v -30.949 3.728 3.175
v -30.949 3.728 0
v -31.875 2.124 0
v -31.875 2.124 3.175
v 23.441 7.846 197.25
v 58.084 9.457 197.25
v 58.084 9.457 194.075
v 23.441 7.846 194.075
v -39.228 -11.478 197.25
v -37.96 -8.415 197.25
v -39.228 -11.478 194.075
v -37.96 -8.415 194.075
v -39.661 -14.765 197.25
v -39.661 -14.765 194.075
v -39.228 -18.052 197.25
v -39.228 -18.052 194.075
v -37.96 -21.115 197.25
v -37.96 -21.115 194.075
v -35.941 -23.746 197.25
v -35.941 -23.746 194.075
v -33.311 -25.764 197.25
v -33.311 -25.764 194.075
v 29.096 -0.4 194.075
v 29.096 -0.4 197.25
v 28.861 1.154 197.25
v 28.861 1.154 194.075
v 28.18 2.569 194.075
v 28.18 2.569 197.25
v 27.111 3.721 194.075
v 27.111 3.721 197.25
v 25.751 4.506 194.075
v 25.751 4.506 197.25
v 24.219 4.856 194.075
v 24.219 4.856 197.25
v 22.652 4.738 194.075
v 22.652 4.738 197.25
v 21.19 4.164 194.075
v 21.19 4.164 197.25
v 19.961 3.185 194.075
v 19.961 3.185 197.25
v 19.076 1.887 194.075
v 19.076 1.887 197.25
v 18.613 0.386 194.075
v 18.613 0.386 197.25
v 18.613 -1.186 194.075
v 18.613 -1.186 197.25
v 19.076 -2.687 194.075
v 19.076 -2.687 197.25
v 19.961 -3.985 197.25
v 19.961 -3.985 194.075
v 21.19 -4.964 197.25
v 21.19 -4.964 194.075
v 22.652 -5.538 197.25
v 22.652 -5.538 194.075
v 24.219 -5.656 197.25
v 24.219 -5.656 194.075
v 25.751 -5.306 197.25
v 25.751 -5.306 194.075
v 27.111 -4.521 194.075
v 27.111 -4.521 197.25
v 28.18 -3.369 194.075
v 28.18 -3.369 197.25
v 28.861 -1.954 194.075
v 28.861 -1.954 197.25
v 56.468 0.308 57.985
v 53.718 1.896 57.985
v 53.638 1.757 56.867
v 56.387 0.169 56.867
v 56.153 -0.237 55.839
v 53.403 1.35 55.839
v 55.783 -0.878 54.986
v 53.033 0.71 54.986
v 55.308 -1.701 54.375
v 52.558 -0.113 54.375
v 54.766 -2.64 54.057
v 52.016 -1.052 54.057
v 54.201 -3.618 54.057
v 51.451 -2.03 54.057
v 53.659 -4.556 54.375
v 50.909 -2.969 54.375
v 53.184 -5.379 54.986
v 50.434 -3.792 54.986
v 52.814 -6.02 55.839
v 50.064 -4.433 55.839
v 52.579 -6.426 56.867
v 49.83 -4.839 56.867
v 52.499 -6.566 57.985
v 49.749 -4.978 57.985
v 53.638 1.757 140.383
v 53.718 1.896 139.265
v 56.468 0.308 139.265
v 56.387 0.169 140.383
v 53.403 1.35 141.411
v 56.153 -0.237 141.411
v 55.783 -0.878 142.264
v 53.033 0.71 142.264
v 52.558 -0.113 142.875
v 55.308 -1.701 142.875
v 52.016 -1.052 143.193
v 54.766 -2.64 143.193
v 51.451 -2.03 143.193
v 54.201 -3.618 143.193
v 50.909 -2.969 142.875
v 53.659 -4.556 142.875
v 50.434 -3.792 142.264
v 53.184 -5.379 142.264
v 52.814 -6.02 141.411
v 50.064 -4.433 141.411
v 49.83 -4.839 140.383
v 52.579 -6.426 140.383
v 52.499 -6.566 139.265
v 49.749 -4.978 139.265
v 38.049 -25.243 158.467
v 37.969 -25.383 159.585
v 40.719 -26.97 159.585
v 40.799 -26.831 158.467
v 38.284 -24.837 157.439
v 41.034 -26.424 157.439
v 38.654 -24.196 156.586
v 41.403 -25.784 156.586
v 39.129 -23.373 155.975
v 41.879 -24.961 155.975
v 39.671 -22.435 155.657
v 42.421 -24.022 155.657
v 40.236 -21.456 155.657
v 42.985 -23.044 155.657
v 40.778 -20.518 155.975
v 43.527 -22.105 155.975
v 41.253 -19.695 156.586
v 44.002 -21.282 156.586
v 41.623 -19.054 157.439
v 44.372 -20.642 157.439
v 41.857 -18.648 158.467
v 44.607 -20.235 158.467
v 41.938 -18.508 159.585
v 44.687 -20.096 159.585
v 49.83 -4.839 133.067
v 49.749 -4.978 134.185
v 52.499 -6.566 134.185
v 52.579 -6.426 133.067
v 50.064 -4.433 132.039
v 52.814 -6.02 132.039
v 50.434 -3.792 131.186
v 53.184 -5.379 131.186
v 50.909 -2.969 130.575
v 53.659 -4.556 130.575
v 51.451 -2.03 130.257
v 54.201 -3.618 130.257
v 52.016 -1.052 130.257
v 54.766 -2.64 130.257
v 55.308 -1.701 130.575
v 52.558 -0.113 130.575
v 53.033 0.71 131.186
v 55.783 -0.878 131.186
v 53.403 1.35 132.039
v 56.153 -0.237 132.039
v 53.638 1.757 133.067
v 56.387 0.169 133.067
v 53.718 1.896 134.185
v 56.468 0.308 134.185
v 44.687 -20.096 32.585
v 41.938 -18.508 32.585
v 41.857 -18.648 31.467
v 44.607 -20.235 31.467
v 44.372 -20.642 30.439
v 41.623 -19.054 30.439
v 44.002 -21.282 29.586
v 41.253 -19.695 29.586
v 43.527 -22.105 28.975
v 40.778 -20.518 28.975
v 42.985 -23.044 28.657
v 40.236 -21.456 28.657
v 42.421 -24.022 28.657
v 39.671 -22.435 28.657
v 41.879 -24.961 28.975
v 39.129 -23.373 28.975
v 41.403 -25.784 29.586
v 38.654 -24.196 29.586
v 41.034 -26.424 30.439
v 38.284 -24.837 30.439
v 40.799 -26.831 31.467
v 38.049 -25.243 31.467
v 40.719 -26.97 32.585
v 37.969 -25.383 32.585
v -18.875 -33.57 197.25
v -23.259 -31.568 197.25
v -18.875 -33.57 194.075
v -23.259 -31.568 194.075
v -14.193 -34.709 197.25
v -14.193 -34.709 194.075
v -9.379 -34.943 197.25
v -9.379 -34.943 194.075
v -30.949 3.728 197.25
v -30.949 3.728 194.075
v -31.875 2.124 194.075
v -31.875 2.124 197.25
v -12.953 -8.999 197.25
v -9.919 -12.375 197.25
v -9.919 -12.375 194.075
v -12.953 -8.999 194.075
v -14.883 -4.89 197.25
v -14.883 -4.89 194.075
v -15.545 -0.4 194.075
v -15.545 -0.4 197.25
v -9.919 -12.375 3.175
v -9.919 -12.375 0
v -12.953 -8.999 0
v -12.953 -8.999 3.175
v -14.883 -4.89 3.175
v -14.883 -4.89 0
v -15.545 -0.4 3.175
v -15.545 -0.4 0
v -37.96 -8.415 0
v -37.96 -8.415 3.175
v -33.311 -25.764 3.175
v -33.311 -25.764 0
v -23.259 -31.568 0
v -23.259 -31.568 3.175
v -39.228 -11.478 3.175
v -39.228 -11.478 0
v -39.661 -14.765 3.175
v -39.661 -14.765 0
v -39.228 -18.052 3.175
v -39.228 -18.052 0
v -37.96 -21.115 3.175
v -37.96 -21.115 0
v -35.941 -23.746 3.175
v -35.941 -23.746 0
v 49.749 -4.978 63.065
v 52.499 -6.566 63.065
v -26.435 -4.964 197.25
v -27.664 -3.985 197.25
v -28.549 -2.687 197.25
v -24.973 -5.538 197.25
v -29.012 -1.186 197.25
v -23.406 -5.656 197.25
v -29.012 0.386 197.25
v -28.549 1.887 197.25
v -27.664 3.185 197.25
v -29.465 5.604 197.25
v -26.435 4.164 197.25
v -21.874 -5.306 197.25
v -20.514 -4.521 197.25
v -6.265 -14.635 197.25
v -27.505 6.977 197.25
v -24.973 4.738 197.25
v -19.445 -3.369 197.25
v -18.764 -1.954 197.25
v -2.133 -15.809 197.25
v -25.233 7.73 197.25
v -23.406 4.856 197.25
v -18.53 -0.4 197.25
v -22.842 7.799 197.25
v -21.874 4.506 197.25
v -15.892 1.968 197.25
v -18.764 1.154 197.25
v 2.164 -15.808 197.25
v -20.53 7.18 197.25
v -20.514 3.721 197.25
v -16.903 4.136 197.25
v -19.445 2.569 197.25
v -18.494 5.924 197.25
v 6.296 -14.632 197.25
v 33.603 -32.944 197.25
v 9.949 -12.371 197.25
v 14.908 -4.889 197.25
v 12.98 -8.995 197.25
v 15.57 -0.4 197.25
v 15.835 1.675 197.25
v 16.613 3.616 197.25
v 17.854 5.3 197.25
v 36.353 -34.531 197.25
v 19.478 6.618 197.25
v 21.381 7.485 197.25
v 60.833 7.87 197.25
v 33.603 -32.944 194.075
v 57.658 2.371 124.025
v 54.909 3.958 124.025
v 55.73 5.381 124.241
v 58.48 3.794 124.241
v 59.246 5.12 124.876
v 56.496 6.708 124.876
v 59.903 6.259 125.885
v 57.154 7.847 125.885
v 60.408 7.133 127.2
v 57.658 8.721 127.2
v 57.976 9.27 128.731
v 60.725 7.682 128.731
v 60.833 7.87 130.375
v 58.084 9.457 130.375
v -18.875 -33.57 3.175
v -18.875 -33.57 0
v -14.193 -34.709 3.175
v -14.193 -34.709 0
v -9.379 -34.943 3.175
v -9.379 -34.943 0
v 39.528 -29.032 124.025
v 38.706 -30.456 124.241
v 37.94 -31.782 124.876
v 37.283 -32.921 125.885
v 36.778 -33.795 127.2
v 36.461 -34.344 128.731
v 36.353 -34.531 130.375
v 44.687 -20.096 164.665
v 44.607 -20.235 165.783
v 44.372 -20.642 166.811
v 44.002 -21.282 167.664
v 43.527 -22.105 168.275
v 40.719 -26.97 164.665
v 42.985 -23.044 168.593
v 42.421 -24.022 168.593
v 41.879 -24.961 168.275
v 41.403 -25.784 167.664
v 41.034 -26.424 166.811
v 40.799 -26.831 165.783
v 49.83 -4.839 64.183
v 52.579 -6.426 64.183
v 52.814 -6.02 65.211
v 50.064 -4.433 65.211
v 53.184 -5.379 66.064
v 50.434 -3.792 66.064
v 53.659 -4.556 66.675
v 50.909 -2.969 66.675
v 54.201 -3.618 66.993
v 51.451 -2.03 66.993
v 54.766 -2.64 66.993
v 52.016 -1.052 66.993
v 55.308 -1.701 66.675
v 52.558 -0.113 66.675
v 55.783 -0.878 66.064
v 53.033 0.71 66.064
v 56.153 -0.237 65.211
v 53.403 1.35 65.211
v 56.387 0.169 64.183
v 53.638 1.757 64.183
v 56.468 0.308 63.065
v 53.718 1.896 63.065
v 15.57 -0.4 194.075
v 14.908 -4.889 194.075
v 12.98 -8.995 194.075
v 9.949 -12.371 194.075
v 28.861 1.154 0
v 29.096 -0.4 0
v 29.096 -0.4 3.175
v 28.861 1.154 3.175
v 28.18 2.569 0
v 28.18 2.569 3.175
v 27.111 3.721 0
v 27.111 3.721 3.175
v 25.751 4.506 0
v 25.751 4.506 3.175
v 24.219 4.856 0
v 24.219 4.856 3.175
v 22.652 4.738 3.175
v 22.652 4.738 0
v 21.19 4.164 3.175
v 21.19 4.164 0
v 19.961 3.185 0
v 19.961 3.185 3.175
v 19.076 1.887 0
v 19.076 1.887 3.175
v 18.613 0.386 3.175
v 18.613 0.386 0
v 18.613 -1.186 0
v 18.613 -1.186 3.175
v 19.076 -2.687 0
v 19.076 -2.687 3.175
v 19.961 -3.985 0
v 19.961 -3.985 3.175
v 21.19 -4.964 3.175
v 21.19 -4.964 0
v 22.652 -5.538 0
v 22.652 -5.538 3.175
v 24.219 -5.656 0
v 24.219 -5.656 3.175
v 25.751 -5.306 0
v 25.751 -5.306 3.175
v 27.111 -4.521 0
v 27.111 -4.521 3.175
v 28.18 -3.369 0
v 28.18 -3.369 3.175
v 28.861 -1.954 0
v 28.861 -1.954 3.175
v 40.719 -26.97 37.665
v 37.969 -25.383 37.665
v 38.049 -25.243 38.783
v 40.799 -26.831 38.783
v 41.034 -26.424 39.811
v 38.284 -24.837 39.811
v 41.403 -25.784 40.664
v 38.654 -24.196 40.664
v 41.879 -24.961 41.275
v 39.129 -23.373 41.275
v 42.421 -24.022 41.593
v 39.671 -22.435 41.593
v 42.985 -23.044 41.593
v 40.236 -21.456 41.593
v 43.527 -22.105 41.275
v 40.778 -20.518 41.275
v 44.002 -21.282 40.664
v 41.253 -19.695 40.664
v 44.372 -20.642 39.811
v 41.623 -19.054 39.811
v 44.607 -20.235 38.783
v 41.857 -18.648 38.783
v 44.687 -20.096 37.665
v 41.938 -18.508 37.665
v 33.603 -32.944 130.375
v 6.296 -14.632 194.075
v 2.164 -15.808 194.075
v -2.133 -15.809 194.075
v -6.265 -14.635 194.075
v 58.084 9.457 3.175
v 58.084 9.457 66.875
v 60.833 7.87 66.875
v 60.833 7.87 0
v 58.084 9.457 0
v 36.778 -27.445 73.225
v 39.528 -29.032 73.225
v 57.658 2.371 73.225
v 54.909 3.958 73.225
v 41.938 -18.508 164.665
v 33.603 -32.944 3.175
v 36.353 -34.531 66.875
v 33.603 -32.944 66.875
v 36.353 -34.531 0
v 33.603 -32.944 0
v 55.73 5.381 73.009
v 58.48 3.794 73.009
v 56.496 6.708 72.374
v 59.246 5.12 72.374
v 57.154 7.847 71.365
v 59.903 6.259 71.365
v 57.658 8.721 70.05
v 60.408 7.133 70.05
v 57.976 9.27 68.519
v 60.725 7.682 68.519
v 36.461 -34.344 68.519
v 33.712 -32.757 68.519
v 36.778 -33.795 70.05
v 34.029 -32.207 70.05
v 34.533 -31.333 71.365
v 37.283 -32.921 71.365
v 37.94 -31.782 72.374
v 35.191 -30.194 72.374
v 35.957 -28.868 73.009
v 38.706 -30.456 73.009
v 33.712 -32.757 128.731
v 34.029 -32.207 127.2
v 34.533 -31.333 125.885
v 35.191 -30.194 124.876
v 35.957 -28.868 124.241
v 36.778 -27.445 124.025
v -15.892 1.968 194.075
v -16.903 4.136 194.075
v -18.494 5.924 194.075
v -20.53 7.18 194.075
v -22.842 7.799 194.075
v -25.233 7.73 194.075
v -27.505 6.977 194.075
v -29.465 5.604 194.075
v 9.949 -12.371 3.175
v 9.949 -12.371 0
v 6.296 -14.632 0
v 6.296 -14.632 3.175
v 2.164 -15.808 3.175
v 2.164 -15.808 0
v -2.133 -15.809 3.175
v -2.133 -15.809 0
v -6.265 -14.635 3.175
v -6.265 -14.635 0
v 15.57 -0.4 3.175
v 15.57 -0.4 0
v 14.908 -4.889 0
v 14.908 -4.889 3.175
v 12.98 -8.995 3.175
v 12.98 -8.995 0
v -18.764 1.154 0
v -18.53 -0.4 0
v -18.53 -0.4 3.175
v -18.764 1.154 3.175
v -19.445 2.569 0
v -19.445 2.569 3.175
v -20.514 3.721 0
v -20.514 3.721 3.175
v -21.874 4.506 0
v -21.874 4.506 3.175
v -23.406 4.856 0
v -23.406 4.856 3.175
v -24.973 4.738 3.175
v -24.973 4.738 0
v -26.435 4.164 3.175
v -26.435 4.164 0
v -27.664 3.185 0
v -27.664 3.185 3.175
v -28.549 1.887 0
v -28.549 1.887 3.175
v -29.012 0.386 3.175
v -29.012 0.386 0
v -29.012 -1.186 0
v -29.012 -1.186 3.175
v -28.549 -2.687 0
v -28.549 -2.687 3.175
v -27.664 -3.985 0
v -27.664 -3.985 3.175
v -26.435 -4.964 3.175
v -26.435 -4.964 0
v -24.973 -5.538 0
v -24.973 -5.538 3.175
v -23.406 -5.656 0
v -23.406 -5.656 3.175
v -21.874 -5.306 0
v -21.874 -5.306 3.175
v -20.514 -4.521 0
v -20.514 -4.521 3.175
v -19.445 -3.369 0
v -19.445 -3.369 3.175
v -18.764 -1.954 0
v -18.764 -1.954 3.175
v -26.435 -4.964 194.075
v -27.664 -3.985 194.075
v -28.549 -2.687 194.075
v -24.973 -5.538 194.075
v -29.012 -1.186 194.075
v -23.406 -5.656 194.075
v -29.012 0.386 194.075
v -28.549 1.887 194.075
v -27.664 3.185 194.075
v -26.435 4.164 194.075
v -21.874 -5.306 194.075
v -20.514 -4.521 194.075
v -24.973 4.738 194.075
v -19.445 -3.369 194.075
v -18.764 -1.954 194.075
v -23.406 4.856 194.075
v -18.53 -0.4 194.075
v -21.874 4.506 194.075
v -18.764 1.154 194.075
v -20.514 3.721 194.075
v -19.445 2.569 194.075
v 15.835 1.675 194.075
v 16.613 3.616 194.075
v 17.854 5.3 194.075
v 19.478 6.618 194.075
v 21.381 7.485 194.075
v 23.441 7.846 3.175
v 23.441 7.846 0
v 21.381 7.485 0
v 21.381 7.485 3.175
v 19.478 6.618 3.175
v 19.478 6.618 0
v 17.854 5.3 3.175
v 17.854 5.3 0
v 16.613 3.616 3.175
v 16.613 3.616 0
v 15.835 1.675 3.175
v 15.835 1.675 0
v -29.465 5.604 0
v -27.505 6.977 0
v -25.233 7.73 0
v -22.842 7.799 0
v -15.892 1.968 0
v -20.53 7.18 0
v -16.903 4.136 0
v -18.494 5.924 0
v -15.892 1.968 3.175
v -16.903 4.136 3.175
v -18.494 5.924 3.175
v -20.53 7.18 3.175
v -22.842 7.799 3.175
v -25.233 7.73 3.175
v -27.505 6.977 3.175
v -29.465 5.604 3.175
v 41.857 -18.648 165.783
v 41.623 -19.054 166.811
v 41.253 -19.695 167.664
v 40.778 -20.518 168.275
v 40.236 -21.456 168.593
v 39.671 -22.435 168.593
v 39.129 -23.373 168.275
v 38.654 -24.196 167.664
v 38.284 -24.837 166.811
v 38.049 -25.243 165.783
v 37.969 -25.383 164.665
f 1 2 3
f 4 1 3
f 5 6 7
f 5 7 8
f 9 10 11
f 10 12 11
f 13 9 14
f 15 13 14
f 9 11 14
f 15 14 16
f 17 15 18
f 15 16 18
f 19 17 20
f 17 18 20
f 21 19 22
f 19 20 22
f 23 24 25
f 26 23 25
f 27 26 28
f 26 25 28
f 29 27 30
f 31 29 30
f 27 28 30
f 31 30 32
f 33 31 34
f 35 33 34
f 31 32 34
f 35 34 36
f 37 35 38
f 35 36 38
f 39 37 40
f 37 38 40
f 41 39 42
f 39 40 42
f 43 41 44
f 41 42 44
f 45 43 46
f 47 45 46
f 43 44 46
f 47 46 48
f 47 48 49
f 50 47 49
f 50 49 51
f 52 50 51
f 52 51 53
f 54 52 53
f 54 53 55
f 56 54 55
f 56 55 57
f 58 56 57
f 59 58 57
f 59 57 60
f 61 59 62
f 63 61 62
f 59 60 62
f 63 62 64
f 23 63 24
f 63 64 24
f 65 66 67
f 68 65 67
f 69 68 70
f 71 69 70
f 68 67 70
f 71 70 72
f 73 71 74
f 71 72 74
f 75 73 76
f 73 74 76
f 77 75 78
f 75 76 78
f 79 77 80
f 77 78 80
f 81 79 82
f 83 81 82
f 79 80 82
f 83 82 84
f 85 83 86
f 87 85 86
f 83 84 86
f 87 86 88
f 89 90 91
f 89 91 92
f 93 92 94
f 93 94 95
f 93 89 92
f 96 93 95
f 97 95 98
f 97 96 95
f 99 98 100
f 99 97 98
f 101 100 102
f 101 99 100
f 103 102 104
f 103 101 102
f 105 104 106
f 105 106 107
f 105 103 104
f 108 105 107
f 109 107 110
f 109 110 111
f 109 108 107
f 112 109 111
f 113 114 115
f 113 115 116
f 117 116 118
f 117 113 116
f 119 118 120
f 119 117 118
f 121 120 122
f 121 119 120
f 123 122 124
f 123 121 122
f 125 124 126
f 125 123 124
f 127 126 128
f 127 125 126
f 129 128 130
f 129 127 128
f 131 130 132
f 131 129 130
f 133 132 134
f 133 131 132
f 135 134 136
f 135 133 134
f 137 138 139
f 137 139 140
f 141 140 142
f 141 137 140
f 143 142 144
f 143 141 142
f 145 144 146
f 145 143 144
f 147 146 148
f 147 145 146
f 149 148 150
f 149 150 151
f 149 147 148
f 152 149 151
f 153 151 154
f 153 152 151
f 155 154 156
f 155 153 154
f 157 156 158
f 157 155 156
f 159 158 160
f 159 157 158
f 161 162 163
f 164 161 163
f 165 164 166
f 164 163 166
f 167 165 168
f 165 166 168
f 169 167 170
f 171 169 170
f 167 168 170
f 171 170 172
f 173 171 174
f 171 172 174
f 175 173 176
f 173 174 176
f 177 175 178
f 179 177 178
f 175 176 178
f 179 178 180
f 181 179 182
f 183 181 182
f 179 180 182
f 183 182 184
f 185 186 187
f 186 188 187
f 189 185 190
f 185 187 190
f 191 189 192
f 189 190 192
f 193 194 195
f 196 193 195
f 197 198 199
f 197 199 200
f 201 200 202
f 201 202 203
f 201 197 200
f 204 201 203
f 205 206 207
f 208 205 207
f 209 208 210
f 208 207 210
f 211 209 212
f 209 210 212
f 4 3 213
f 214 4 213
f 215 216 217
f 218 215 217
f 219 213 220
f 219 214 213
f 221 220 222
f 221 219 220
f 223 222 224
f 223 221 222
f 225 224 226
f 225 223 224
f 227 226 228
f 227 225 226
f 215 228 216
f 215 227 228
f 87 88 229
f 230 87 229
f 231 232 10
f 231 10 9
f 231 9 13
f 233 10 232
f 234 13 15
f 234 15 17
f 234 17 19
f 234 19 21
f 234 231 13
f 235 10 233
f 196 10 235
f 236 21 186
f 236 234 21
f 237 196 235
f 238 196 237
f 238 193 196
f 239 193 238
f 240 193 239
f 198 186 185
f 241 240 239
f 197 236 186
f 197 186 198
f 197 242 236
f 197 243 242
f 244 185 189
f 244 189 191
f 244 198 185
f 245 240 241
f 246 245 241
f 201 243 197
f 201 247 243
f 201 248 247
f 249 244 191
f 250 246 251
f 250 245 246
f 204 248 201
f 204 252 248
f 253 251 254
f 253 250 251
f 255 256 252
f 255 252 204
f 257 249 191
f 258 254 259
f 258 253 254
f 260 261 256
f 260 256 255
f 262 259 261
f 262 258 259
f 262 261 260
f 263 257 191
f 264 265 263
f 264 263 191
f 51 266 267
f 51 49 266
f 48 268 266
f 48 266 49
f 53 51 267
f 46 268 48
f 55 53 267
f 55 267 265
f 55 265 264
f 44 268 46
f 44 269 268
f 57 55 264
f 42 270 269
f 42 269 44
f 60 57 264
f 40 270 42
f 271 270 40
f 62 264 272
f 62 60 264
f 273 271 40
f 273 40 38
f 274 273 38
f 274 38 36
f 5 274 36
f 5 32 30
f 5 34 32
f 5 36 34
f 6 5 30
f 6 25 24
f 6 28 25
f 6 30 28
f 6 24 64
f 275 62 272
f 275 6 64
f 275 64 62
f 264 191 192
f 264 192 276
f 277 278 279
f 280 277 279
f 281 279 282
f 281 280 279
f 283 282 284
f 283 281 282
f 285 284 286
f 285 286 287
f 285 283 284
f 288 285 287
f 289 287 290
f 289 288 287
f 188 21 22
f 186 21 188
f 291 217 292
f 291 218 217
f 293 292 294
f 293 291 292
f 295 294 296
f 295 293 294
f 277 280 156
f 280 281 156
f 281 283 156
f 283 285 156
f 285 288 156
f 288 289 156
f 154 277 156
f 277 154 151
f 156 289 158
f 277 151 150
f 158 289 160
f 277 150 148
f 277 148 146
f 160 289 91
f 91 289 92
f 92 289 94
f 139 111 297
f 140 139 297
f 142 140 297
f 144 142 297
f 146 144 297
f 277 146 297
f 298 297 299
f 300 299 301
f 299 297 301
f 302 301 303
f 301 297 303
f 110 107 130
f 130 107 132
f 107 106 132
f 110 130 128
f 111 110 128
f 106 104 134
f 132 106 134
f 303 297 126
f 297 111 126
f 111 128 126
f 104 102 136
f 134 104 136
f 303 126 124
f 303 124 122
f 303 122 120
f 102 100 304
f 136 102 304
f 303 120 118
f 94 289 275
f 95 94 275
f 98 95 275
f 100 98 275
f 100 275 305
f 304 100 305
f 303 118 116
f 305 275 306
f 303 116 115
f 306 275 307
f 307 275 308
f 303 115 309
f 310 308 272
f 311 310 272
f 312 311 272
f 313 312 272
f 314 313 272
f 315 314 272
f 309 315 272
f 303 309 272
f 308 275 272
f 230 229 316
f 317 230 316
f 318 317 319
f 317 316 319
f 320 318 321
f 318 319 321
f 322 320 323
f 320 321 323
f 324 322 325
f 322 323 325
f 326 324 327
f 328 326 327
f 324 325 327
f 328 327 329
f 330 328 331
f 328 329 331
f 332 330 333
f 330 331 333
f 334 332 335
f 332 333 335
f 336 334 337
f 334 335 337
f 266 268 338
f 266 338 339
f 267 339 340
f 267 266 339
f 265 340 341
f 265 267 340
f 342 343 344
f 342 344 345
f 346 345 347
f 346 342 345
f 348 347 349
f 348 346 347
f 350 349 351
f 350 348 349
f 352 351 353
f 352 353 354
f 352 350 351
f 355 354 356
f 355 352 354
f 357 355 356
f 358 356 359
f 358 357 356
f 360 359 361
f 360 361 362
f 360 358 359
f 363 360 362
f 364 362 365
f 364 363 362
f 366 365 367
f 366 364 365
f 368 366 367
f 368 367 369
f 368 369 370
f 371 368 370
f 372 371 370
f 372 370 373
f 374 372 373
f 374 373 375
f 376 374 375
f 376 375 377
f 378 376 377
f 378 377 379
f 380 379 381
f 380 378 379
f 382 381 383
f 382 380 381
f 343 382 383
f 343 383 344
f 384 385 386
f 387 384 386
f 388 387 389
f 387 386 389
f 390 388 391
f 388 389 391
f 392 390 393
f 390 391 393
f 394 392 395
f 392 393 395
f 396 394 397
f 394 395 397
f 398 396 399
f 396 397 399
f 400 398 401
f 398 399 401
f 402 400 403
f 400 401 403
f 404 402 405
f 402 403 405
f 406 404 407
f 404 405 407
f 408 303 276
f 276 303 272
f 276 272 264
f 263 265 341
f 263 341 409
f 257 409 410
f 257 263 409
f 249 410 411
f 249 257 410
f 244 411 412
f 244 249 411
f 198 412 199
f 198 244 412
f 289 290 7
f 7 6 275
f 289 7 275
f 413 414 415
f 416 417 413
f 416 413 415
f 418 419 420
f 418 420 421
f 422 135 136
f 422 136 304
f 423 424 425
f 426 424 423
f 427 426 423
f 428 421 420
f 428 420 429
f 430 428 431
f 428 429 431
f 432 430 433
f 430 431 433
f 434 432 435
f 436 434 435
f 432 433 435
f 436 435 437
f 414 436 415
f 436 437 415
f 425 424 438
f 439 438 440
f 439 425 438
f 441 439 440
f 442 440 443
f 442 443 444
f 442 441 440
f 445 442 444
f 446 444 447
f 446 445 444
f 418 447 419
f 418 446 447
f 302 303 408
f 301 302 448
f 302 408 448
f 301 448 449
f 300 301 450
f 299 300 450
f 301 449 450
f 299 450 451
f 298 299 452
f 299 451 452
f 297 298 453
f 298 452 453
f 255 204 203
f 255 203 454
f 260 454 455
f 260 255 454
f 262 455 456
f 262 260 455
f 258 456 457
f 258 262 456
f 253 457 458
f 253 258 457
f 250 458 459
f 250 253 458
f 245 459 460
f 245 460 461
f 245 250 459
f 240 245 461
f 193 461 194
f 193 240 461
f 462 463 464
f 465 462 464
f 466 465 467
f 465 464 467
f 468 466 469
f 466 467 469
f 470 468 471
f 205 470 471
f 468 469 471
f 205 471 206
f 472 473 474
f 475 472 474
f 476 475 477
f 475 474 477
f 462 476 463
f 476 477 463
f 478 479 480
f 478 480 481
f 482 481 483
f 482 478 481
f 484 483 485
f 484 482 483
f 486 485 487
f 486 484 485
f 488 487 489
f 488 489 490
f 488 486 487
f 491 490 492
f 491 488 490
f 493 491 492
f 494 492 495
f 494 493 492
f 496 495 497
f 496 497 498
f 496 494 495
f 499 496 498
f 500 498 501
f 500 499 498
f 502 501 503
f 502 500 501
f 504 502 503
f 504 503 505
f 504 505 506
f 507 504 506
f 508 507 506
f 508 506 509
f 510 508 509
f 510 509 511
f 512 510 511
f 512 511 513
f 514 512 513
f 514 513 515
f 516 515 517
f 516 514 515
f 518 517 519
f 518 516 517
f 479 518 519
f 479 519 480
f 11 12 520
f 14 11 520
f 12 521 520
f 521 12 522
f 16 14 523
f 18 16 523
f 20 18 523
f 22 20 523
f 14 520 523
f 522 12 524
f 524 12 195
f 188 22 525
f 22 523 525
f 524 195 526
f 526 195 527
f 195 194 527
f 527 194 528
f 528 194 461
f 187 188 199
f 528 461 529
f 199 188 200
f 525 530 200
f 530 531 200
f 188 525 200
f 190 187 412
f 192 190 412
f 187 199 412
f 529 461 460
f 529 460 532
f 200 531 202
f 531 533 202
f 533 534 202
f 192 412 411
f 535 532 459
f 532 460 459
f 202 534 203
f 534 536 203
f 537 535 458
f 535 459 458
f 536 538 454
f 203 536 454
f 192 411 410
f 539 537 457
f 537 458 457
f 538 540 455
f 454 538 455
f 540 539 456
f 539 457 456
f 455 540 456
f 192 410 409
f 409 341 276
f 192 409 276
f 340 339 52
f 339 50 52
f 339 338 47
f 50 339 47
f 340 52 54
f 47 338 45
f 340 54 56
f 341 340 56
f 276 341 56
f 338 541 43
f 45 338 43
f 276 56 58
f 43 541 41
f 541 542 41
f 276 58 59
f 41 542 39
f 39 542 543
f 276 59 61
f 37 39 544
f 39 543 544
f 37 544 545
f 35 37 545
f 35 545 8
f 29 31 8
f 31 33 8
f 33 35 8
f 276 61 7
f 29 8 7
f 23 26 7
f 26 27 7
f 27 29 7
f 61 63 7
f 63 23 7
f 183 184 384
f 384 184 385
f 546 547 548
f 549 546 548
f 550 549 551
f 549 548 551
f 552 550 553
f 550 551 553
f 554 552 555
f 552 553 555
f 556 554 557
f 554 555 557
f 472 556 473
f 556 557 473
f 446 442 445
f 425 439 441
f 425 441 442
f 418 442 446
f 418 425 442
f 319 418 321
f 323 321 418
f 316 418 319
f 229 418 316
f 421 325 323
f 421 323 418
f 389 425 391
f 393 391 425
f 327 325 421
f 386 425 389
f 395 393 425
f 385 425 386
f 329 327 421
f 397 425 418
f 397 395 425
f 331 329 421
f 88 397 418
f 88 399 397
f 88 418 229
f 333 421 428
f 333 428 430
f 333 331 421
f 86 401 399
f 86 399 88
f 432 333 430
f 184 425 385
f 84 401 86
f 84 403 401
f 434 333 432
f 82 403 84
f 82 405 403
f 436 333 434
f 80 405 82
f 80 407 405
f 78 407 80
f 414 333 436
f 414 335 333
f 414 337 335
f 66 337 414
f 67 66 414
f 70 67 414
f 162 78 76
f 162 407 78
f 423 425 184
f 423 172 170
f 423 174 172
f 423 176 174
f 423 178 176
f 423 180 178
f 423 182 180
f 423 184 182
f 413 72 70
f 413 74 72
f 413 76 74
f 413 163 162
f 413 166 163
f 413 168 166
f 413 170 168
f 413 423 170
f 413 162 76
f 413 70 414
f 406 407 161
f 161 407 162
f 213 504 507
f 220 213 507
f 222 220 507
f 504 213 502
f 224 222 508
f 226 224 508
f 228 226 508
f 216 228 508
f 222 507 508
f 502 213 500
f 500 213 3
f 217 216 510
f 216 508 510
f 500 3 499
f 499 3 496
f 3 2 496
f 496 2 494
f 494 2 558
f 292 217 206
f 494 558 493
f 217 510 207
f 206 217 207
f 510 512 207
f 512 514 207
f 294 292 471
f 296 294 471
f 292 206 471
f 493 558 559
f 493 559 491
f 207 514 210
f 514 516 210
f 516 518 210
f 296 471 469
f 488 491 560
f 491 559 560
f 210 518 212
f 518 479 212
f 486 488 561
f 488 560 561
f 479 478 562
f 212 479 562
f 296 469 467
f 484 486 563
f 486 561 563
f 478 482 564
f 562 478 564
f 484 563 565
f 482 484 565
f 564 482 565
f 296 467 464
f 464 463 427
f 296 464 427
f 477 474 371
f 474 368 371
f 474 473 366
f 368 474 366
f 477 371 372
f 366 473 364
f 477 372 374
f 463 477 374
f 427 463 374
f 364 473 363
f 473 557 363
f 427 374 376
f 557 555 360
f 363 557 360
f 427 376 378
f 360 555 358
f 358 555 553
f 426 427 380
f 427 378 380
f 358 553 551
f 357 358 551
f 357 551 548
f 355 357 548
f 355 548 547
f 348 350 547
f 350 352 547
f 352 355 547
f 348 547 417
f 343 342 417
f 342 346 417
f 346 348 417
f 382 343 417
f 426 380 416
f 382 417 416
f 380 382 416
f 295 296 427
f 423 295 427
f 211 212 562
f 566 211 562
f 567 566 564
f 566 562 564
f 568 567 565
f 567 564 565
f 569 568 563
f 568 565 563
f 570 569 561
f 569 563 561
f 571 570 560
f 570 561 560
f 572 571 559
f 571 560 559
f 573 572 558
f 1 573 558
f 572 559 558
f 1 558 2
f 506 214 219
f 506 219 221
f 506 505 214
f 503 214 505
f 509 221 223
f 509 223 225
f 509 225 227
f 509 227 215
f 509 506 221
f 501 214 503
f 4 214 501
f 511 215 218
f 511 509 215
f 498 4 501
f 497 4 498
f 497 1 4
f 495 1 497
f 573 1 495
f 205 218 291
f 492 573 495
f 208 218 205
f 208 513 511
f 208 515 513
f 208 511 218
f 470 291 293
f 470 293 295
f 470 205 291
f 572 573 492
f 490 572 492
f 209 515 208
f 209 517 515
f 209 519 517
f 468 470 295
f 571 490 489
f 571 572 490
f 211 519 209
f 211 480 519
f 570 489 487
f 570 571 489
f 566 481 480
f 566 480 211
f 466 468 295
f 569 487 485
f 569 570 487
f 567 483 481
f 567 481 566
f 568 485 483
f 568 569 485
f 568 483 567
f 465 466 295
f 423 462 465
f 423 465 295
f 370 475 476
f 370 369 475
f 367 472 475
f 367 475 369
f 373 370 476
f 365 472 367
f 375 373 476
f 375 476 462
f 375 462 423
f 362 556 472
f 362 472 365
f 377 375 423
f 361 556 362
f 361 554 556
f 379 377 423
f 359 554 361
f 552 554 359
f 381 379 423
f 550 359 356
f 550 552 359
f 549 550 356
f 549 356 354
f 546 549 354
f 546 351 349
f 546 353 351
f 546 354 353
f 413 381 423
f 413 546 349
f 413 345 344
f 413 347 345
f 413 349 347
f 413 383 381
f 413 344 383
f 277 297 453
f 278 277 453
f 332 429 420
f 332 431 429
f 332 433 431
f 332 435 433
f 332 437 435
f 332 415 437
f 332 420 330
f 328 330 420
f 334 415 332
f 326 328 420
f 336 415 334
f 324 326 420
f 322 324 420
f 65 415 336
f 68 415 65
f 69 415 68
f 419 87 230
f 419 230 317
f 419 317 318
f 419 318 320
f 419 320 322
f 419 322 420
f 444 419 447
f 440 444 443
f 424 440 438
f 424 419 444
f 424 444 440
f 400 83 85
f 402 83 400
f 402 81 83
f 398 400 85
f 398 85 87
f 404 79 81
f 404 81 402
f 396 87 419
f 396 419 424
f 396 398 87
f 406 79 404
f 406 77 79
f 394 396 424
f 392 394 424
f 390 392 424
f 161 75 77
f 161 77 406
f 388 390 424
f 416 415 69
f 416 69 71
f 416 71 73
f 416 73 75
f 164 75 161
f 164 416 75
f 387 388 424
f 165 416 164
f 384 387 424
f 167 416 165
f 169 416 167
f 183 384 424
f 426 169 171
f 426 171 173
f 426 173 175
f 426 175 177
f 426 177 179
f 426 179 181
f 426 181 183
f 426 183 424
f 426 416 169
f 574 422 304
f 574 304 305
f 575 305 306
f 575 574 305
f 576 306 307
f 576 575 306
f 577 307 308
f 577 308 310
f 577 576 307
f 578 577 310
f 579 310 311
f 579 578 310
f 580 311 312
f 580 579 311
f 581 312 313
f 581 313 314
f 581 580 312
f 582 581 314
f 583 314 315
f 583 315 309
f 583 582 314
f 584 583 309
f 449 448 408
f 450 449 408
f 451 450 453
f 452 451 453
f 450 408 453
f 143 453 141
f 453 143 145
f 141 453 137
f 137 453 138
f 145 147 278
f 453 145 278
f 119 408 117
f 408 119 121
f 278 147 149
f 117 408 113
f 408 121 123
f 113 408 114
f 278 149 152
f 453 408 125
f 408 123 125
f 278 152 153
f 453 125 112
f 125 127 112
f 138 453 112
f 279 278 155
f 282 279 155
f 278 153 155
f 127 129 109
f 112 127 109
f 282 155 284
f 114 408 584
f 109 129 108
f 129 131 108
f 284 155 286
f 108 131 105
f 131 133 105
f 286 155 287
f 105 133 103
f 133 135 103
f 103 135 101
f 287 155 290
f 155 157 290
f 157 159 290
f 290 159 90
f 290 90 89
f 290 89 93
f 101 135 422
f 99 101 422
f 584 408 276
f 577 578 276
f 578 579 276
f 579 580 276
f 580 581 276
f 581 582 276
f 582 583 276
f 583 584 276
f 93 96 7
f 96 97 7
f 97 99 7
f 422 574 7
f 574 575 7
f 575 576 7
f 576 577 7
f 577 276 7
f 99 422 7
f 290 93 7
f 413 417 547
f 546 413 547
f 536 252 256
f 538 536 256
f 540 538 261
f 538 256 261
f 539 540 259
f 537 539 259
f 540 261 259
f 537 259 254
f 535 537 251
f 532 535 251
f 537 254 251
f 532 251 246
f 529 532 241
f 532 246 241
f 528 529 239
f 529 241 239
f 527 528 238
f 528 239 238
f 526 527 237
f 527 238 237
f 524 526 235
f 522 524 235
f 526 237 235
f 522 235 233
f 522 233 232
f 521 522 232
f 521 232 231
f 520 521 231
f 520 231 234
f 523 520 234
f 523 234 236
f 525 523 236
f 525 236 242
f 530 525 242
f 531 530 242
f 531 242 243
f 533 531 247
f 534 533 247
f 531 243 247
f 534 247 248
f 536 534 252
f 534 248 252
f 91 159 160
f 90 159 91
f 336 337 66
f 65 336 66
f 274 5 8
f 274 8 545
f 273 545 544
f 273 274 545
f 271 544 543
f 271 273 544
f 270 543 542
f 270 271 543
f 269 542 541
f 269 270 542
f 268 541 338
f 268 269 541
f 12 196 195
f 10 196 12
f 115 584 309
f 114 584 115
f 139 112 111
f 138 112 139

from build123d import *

# Parameters (mm, degrees)
SKETCH3_R           = 5.2705
BOSS_EXTRUDE1_DEPTH = 3.175
BOSS_EXTRUDE2_DEPTH = 70.05
FILLET1_R           = 12.7
FILLET3_R           = 25.4
SKETCH5_R           = 3.96875
CUT_EXTRUDE1_DEPTH  = 6.35
FILLET4_R           = 6.35


with BuildPart() as part:
    # Sketch3 → Boss-Extrude1 (new body)
    with BuildSketch(Plane.XY):
        with BuildLine():
            Line((-31.875, 1.314467847), (-31.875, 2.123689729))
            Line((-31.875, 2.123689729), (-44.309751158, -19.413931056))
            Line((-44.309751158, -19.413931056), (-16.813444588, -35.288931056))
            Line((-16.813444588, -35.288931056), (33.603324087, -32.943986013))
            Line((33.603324087, -32.943986013), (36.352954744, -34.531486013))
            Line((36.352954744, -34.531486013), (60.833371586, 7.869839748))
            Line((60.833371586, 7.869839748), (58.083740929, 9.457339748))
            Line((58.083740929, 9.457339748), (23.441464566, 7.84608547))
            ThreePointArc((23.441464566, 7.84608547), (28.824079828, 6.169187612), (31.875, 1.428257367))
            ThreePointArc((31.875, 1.428257367), (32.028589915, 0.519857326), (32.08, -0.4))
            ThreePointArc((32.08, -0.4), (32.028589915, -1.319857326), (31.875, -2.228257367))
            Line((31.875, -2.228257367), (31.875, -6.284053394))
            ThreePointArc((31.875, -6.284053394), (21.132205448, -10.12115273), (9.948783703, -12.371051434))
            ThreePointArc((9.948783703, -12.371051434), (0.015428746, -15.957499724), (-9.919275826, -12.374791656))
            ThreePointArc((-9.919275826, -12.374791656), (-21.117875037, -10.125129582), (-31.875, -6.284053394))
            Line((-31.875, -6.284053394), (-31.875, -2.114467847))
            ThreePointArc((-31.875, -2.114467847), (-32.055, -0.4), (-31.875, 1.314467847))
        make_face()
        with BuildLine():
            ThreePointArc((15.57, -0.4), (14.094750174, -7.012566542), (9.948783703, -12.371051434))
            ThreePointArc((9.948783703, -12.371051434), (21.132205448, -10.12115273), (31.875, -6.284053394))
            Line((31.875, -6.284053394), (31.875, -2.228257367))
            ThreePointArc((31.875, -2.228257367), (22.905142674, -8.603589915), (15.57, -0.4))
        make_face()
        with BuildLine():
            ThreePointArc((23.441464566, 7.84608547), (17.853772739, 5.299953508), (15.57, -0.4))
            ThreePointArc((15.57, -0.4), (22.905142674, -8.603589915), (31.875, -2.228257367))
            Line((31.875, -2.228257367), (31.875, 1.428257367))
            ThreePointArc((31.875, 1.428257367), (28.824079828, 6.169187612), (23.441464566, 7.84608547))
        make_face()
        with Locations((23.825, -0.4)):
            Circle(SKETCH3_R, mode=Mode.SUBTRACT)
        with BuildLine():
            ThreePointArc((-9.919275826, -12.374791656), (-14.068505089, -7.015217451), (-15.545, -0.4))
            ThreePointArc((-15.545, -0.4), (-22.938054526, -8.609876674), (-31.875, -2.114467847))
            Line((-31.875, -2.114467847), (-31.875, -6.284053394))
            ThreePointArc((-31.875, -6.284053394), (-21.117875037, -10.125129582), (-9.919275826, -12.374791656))
        make_face()
        with BuildLine():
            ThreePointArc((-15.545, -0.4), (-21.663448783, 7.573717696), (-30.949039708, 3.7275))
            ThreePointArc((-30.949039708, 3.7275), (-31.507044005, 2.557447835), (-31.875, 1.314467847))
            Line((-31.875, 1.314467847), (-31.875, -2.114467847))
            ThreePointArc((-31.875, -2.114467847), (-22.938054526, -8.609876674), (-15.545, -0.4))
        make_face()
        with Locations((-23.8, -0.4)):
            Circle(SKETCH3_R, mode=Mode.SUBTRACT)
        with BuildLine():
            Line((31.875, 1.428257367), (31.875, -2.228257367))
            ThreePointArc((31.875, -2.228257367), (32.028589915, -1.319857326), (32.08, -0.4))
            ThreePointArc((32.08, -0.4), (32.028589915, 0.519857326), (31.875, 1.428257367))
        make_face()
        with BuildLine():
            Line((-31.875, -2.114467847), (-31.875, 1.314467847))
            ThreePointArc((-31.875, 1.314467847), (-32.055, -0.4), (-31.875, -2.114467847))
        make_face()
        with BuildLine():
            ThreePointArc((-31.875, 1.314467847), (-31.507044005, 2.557447835), (-30.949039708, 3.7275))
            Line((-30.949039708, 3.7275), (-31.875, 2.123689729))
            Line((-31.875, 2.123689729), (-31.875, 1.314467847))
        make_face()
    extrude(amount=BOSS_EXTRUDE1_DEPTH)

    # Sketch4 → Boss-Extrude2 (add)
    with BuildSketch(Plane.XY.offset(3.175)):
        Polygon((60.833371586, 7.869839748), (36.352954744, -34.531486013), (33.603324087, -32.943986013), (58.083740929, 9.457339748), align=None)
    extrude(amount=BOSS_EXTRUDE2_DEPTH)

    # Fillet1
    fillet1_edges = [part.edges().sort_by_distance(p)[0] for p in [
        (-44.309751158, -19.413931056, 1.5875),
    ]]
    fillet(fillet1_edges, radius=FILLET1_R)

    # Fillet3
    fillet3_edges = [part.edges().sort_by_distance(p)[0] for p in [
        (-16.813444588, -35.288931056, 1.5875),
    ]]
    fillet(fillet3_edges, radius=FILLET3_R)

    # Sketch5 → Cut-Extrude1 (cut)
    with BuildSketch(Plane(origin=(39.46765746, -22.786662659, 0), x_dir=(0, 0, 1), z_dir=(-0.866025404, 0.5, 0))):
        with Locations((37.665, 0.971333254)):
            Circle(SKETCH5_R)
        with Locations((32.585, 0.971333254)):
            Circle(SKETCH5_R)
        with BuildLine():
            Line((37.665, 4.940083254), (32.585, 4.940083254))
            ThreePointArc((32.585, 4.940083254), (33.935614932, 4.703198186), (35.125, 4.020821172))
            ThreePointArc((35.125, 4.020821172), (36.314385068, 4.703198186), (37.665, 4.940083254))
        make_face()
        with BuildLine():
            ThreePointArc((35.125, -2.078154664), (33.935614932, -2.760531678), (32.585, -2.997416746))
            Line((32.585, -2.997416746), (37.665, -2.997416746))
            ThreePointArc((37.665, -2.997416746), (36.314385068, -2.760531678), (35.125, -2.078154664))
        make_face()
        with Locations((63.065, 24.532166939)):
            Circle(SKETCH5_R)
        with Locations((57.985, 24.532166939)):
            Circle(SKETCH5_R)
        with BuildLine():
            Line((63.065, 28.500916939), (57.985, 28.500916939))
            ThreePointArc((57.985, 28.500916939), (59.335614932, 28.26403187), (60.525, 27.581654857))
            ThreePointArc((60.525, 27.581654857), (61.714385068, 28.26403187), (63.065, 28.500916939))
        make_face()
        with BuildLine():
            ThreePointArc((60.525, 21.482679021), (59.335614932, 20.800302007), (57.985, 20.563416939))
            Line((57.985, 20.563416939), (63.065, 20.563416939))
            ThreePointArc((63.065, 20.563416939), (61.714385068, 20.800302007), (60.525, 21.482679021))
        make_face()
    extrude(amount=-CUT_EXTRUDE1_DEPTH, mode=Mode.SUBTRACT)

    # Fillet4
    fillet4_edges = [part.edges().sort_by_distance(p)[0] for p in [
        (34.978139415, -33.737736013, 73.225),
        (59.458556258, 8.663589748, 73.225),
    ]]
    fillet(fillet4_edges, radius=FILLET4_R)


with BuildPart() as body_2:
    # Mirror3: mirrored copy
    add(part.part.mirror(Plane.XY.offset(98.625)))


solid = Compound([part.part, body_2.part])
